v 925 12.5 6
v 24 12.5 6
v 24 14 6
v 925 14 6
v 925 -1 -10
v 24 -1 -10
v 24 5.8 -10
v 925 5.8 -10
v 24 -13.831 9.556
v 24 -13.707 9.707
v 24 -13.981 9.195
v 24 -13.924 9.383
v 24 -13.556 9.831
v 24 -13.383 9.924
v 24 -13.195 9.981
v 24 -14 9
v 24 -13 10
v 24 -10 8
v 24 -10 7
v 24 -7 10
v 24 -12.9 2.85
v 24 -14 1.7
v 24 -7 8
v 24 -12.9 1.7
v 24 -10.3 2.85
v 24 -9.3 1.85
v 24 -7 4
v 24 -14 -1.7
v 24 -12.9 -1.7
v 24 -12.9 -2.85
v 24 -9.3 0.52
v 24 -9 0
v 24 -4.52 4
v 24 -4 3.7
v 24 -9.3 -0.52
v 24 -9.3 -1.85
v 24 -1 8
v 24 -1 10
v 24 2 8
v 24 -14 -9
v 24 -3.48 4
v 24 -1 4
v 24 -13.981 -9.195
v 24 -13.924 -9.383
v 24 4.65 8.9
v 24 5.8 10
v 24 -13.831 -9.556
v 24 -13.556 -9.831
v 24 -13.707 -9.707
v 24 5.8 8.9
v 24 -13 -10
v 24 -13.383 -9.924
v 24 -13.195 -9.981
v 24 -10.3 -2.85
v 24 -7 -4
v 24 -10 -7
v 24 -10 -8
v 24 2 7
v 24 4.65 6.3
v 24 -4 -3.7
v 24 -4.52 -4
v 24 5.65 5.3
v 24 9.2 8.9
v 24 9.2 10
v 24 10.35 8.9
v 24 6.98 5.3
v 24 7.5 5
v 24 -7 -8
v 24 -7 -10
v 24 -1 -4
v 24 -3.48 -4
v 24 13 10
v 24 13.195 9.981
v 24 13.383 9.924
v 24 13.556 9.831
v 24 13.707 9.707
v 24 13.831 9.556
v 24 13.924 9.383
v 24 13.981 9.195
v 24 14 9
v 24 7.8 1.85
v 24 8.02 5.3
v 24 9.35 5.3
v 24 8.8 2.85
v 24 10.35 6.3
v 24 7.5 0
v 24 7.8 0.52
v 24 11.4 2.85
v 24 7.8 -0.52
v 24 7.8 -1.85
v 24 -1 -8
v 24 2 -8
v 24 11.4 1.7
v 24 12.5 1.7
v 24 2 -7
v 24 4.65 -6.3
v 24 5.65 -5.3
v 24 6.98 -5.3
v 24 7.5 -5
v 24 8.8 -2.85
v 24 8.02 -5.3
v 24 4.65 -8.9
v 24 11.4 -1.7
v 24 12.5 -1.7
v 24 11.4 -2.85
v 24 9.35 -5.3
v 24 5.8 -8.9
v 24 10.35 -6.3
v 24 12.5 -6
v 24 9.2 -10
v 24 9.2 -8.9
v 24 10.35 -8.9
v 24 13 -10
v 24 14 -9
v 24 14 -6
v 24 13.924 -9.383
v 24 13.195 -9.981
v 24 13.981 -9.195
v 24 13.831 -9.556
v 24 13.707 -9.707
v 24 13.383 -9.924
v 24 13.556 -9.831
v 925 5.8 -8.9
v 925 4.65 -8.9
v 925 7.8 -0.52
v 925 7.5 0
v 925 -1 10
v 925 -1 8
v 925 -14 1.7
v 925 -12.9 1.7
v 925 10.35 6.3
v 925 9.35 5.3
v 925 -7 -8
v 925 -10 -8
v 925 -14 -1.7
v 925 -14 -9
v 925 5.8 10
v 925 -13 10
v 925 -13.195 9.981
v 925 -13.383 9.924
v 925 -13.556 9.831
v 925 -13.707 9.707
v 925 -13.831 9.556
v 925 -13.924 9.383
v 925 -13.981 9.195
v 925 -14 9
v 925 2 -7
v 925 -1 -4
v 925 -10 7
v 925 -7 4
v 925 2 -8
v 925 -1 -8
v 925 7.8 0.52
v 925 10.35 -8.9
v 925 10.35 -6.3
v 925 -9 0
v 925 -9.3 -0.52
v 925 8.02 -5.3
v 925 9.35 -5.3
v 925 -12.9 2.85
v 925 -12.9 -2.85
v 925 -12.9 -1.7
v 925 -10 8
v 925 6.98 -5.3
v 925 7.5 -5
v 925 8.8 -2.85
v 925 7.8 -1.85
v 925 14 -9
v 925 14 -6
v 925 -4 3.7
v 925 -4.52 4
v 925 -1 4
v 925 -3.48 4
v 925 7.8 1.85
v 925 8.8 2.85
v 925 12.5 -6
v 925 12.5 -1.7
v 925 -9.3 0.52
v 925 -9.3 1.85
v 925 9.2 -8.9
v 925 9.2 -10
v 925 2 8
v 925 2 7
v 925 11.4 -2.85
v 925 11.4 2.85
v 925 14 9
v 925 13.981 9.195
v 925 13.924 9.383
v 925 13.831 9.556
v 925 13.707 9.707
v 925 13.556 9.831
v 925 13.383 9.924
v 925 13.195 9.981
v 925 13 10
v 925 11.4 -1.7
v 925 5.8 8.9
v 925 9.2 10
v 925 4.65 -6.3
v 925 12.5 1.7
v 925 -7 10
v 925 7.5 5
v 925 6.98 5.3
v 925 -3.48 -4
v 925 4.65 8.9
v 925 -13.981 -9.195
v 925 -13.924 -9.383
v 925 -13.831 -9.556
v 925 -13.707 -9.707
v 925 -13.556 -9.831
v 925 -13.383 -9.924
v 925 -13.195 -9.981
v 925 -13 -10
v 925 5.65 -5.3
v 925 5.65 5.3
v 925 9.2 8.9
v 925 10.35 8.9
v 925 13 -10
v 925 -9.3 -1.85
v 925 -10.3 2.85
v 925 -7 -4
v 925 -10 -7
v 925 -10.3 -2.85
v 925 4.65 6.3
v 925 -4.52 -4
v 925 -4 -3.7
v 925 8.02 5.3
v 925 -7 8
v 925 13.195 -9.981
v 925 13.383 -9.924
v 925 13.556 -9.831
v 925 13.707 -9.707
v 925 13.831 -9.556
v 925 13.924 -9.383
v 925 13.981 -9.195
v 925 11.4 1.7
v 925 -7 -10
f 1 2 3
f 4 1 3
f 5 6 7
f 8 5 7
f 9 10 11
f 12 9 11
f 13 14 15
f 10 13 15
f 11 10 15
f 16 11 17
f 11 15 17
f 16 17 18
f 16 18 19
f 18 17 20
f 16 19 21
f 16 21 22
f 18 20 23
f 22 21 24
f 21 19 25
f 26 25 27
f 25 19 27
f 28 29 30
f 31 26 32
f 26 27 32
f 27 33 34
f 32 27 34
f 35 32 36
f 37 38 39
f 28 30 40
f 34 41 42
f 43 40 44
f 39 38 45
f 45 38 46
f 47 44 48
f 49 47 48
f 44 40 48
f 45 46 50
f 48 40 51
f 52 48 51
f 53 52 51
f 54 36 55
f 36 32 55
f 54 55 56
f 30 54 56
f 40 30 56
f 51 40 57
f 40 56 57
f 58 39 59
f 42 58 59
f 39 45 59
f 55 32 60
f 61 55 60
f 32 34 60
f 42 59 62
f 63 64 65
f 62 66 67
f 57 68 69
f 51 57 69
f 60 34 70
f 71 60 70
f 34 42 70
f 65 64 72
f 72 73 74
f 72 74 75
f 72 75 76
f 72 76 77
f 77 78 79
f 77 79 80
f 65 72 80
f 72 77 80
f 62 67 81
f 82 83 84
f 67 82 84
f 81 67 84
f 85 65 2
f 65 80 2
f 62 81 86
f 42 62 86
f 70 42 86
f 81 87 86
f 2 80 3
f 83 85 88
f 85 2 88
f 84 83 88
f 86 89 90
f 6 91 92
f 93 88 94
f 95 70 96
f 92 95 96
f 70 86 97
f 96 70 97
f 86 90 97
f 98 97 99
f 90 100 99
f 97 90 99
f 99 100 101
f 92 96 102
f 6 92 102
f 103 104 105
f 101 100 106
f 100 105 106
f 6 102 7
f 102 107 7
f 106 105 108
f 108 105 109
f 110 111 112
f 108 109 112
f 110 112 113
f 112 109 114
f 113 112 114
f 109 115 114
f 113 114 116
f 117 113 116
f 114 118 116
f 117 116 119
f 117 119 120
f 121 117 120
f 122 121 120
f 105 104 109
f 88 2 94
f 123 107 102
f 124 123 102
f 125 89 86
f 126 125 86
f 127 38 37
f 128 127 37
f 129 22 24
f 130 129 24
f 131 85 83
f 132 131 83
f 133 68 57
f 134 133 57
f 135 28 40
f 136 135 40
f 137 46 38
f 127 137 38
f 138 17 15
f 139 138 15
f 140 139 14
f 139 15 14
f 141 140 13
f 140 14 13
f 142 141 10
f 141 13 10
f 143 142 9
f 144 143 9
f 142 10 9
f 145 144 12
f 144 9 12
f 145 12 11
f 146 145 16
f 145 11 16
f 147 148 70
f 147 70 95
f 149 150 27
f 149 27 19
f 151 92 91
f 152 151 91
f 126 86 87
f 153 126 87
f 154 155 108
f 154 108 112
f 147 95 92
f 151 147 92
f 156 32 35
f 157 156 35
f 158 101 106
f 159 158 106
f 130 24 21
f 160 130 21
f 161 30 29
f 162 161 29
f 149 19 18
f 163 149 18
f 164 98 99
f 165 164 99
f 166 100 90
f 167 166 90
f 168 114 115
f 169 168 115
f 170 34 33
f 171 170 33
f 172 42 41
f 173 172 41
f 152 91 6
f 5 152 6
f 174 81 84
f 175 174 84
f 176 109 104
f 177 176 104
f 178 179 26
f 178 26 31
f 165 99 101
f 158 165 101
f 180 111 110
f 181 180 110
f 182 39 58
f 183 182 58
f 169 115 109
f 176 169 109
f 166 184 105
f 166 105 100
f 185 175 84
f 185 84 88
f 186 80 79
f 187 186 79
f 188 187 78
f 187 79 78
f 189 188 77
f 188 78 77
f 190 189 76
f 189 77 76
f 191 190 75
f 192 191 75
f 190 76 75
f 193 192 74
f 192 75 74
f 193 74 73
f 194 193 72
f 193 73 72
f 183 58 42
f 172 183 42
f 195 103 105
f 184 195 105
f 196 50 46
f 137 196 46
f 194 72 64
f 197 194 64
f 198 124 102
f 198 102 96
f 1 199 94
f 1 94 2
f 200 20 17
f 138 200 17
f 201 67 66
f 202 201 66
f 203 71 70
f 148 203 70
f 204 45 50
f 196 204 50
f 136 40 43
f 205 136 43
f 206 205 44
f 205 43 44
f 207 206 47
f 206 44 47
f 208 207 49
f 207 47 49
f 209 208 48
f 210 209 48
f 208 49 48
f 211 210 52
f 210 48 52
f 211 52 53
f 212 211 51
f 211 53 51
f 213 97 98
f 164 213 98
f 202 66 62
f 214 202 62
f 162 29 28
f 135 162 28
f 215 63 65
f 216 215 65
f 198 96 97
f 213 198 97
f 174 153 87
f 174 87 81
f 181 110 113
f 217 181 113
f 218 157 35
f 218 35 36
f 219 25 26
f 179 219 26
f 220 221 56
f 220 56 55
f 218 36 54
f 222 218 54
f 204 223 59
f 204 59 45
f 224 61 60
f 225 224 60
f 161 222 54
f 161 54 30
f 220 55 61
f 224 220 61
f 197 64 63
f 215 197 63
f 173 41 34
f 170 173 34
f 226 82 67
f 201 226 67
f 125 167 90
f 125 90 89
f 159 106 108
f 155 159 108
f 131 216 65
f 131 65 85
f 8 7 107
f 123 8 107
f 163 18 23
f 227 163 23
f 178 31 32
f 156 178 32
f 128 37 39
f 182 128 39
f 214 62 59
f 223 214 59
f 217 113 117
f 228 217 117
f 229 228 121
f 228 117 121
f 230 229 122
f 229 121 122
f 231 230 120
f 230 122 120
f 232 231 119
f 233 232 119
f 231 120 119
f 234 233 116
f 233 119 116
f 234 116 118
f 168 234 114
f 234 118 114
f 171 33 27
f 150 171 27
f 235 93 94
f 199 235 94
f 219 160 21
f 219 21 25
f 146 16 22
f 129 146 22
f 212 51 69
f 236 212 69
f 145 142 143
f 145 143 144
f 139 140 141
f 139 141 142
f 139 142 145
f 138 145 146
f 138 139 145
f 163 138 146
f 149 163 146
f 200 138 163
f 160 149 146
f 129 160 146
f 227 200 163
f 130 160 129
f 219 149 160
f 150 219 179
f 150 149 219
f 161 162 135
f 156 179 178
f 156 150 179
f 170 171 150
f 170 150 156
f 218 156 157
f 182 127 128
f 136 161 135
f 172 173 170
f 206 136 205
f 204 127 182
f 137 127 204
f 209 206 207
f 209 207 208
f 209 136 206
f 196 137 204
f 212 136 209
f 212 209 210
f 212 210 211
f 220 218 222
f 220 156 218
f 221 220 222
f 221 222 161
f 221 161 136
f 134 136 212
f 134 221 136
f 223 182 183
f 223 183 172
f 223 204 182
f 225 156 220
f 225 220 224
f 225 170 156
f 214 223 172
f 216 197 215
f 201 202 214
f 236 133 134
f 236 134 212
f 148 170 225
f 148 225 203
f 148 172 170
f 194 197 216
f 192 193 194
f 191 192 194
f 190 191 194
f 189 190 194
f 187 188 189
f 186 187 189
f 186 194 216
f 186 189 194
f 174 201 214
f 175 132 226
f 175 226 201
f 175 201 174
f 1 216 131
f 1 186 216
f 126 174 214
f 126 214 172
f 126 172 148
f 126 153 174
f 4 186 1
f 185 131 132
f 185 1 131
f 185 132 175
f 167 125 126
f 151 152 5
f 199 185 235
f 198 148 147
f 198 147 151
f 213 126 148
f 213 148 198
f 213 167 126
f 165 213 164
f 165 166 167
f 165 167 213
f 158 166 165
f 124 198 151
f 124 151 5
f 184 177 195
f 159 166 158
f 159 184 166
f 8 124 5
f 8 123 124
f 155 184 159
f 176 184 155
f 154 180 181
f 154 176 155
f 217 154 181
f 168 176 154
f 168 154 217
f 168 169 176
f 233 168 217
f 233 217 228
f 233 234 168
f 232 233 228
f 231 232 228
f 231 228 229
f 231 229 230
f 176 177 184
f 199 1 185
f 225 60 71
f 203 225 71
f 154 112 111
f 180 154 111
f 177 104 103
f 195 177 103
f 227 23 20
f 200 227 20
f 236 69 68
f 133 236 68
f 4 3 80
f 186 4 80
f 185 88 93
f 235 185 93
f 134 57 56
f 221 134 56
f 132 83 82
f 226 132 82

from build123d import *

# Parameters (mm, degrees)
BOSS_EXTRUDE1_DEPTH = 901


with BuildPart() as part:
    # Sketch1 → Boss-Extrude1 (new body)
    with BuildSketch(Plane(origin=(24, 0, 0), x_dir=(0, 0, -1), z_dir=(1, 0, 0))):
        with BuildLine():
            Line((-5.3, 9.35), (-5.3, 8.019615242))
            Line((-5.3, 8.019615242), (-5, 7.5))
            Line((-5, 7.5), (-5.3, 6.980384758))
            Line((-5.3, 6.980384758), (-5.3, 5.65))
            Line((-5.3, 5.65), (-6.3, 4.65))
            Line((-6.3, 4.65), (-8.9, 4.65))
            Line((-8.9, 4.65), (-8.9, 5.8))
            Line((-8.9, 5.8), (-10, 5.8))
            Line((-10, 5.8), (-10, -1))
            Line((-10, -1), (-8, -1))
            Line((-8, -1), (-8, 2))
            Line((-8, 2), (-7, 2))
            Line((-7, 2), (-4, -1))
            Line((-4, -1), (-4, -3.480384758))
            Line((-4, -3.480384758), (-3.7, -4))
            Line((-3.7, -4), (-4, -4.519615242))
            Line((-4, -4.519615242), (-4, -7))
            Line((-4, -7), (-7, -10))
            Line((-7, -10), (-8, -10))
            Line((-8, -10), (-8, -7))
            Line((-8, -7), (-10, -7))
            Line((-10, -7), (-10, -13))
            ThreePointArc((-10, -13), (-9.707106781, -13.707106781), (-9, -14))
            Line((-9, -14), (-1.7, -14))
            Line((-1.7, -14), (-1.7, -12.9))
            Line((-1.7, -12.9), (-2.85, -12.9))
            Line((-2.85, -12.9), (-2.85, -10.3))
            Line((-2.85, -10.3), (-1.85, -9.3))
            Line((-1.85, -9.3), (-0.519615242, -9.3))
            Line((-0.519615242, -9.3), (0, -9))
            Line((0, -9), (0.519615242, -9.3))
            Line((0.519615242, -9.3), (1.85, -9.3))
            Line((1.85, -9.3), (2.85, -10.3))
            Line((2.85, -10.3), (2.85, -12.9))
            Line((2.85, -12.9), (1.7, -12.9))
            Line((1.7, -12.9), (1.7, -14))
            Line((1.7, -14), (9, -14))
            ThreePointArc((9, -14), (9.707106781, -13.707106781), (10, -13))
            Line((10, -13), (10, -7))
            Line((10, -7), (8, -7))
            Line((8, -7), (8, -10))
            Line((8, -10), (7, -10))
            Line((7, -10), (4, -7))
            Line((4, -7), (4, -4.519615242))
            Line((4, -4.519615242), (3.7, -4))
            Line((3.7, -4), (4, -3.480384758))
            Line((4, -3.480384758), (4, -1))
            Line((4, -1), (7, 2))
            Line((7, 2), (8, 2))
            Line((8, 2), (8, -1))
            Line((8, -1), (10, -1))
            Line((10, -1), (10, 5.8))
            Line((10, 5.8), (8.9, 5.8))
            Line((8.9, 5.8), (8.9, 4.65))
            Line((8.9, 4.65), (6.3, 4.65))
            Line((6.3, 4.65), (5.3, 5.65))
            Line((5.3, 5.65), (5.3, 6.980384758))
            Line((5.3, 6.980384758), (5, 7.5))
            Line((5, 7.5), (5.3, 8.019615242))
            Line((5.3, 8.019615242), (5.3, 9.35))
            Line((5.3, 9.35), (6.3, 10.35))
            Line((6.3, 10.35), (8.9, 10.35))
            Line((8.9, 10.35), (8.9, 9.2))
            Line((8.9, 9.2), (10, 9.2))
            Line((10, 9.2), (10, 13))
            ThreePointArc((10, 13), (9.707106781, 13.707106781), (9, 14))
            Line((9, 14), (6, 14))
            Line((6, 14), (6, 12.5))
            Line((6, 12.5), (1.7, 12.5))
            Line((1.7, 12.5), (1.7, 11.4))
            Line((1.7, 11.4), (2.85, 11.4))
            Line((2.85, 11.4), (2.85, 8.8))
            Line((2.85, 8.8), (1.85, 7.8))
            Line((1.85, 7.8), (0.519615242, 7.8))
            Line((0.519615242, 7.8), (0, 7.5))
            Line((0, 7.5), (-0.519615242, 7.8))
            Line((-0.519615242, 7.8), (-1.85, 7.8))
            Line((-1.85, 7.8), (-2.85, 8.8))
            Line((-2.85, 8.8), (-2.85, 11.4))
            Line((-2.85, 11.4), (-1.7, 11.4))
            Line((-1.7, 11.4), (-1.7, 12.5))
            Line((-1.7, 12.5), (-6, 12.5))
            Line((-6, 12.5), (-6, 14))
            Line((-6, 14), (-9, 14))
            ThreePointArc((-9, 14), (-9.707106781, 13.707106781), (-10, 13))
            Line((-10, 13), (-10, 9.2))
            Line((-10, 9.2), (-8.9, 9.2))
            Line((-8.9, 9.2), (-8.9, 10.35))
            Line((-8.9, 10.35), (-6.3, 10.35))
            Line((-6.3, 10.35), (-5.3, 9.35))
        make_face()
    extrude(amount=BOSS_EXTRUDE1_DEPTH)


solid = part.part
